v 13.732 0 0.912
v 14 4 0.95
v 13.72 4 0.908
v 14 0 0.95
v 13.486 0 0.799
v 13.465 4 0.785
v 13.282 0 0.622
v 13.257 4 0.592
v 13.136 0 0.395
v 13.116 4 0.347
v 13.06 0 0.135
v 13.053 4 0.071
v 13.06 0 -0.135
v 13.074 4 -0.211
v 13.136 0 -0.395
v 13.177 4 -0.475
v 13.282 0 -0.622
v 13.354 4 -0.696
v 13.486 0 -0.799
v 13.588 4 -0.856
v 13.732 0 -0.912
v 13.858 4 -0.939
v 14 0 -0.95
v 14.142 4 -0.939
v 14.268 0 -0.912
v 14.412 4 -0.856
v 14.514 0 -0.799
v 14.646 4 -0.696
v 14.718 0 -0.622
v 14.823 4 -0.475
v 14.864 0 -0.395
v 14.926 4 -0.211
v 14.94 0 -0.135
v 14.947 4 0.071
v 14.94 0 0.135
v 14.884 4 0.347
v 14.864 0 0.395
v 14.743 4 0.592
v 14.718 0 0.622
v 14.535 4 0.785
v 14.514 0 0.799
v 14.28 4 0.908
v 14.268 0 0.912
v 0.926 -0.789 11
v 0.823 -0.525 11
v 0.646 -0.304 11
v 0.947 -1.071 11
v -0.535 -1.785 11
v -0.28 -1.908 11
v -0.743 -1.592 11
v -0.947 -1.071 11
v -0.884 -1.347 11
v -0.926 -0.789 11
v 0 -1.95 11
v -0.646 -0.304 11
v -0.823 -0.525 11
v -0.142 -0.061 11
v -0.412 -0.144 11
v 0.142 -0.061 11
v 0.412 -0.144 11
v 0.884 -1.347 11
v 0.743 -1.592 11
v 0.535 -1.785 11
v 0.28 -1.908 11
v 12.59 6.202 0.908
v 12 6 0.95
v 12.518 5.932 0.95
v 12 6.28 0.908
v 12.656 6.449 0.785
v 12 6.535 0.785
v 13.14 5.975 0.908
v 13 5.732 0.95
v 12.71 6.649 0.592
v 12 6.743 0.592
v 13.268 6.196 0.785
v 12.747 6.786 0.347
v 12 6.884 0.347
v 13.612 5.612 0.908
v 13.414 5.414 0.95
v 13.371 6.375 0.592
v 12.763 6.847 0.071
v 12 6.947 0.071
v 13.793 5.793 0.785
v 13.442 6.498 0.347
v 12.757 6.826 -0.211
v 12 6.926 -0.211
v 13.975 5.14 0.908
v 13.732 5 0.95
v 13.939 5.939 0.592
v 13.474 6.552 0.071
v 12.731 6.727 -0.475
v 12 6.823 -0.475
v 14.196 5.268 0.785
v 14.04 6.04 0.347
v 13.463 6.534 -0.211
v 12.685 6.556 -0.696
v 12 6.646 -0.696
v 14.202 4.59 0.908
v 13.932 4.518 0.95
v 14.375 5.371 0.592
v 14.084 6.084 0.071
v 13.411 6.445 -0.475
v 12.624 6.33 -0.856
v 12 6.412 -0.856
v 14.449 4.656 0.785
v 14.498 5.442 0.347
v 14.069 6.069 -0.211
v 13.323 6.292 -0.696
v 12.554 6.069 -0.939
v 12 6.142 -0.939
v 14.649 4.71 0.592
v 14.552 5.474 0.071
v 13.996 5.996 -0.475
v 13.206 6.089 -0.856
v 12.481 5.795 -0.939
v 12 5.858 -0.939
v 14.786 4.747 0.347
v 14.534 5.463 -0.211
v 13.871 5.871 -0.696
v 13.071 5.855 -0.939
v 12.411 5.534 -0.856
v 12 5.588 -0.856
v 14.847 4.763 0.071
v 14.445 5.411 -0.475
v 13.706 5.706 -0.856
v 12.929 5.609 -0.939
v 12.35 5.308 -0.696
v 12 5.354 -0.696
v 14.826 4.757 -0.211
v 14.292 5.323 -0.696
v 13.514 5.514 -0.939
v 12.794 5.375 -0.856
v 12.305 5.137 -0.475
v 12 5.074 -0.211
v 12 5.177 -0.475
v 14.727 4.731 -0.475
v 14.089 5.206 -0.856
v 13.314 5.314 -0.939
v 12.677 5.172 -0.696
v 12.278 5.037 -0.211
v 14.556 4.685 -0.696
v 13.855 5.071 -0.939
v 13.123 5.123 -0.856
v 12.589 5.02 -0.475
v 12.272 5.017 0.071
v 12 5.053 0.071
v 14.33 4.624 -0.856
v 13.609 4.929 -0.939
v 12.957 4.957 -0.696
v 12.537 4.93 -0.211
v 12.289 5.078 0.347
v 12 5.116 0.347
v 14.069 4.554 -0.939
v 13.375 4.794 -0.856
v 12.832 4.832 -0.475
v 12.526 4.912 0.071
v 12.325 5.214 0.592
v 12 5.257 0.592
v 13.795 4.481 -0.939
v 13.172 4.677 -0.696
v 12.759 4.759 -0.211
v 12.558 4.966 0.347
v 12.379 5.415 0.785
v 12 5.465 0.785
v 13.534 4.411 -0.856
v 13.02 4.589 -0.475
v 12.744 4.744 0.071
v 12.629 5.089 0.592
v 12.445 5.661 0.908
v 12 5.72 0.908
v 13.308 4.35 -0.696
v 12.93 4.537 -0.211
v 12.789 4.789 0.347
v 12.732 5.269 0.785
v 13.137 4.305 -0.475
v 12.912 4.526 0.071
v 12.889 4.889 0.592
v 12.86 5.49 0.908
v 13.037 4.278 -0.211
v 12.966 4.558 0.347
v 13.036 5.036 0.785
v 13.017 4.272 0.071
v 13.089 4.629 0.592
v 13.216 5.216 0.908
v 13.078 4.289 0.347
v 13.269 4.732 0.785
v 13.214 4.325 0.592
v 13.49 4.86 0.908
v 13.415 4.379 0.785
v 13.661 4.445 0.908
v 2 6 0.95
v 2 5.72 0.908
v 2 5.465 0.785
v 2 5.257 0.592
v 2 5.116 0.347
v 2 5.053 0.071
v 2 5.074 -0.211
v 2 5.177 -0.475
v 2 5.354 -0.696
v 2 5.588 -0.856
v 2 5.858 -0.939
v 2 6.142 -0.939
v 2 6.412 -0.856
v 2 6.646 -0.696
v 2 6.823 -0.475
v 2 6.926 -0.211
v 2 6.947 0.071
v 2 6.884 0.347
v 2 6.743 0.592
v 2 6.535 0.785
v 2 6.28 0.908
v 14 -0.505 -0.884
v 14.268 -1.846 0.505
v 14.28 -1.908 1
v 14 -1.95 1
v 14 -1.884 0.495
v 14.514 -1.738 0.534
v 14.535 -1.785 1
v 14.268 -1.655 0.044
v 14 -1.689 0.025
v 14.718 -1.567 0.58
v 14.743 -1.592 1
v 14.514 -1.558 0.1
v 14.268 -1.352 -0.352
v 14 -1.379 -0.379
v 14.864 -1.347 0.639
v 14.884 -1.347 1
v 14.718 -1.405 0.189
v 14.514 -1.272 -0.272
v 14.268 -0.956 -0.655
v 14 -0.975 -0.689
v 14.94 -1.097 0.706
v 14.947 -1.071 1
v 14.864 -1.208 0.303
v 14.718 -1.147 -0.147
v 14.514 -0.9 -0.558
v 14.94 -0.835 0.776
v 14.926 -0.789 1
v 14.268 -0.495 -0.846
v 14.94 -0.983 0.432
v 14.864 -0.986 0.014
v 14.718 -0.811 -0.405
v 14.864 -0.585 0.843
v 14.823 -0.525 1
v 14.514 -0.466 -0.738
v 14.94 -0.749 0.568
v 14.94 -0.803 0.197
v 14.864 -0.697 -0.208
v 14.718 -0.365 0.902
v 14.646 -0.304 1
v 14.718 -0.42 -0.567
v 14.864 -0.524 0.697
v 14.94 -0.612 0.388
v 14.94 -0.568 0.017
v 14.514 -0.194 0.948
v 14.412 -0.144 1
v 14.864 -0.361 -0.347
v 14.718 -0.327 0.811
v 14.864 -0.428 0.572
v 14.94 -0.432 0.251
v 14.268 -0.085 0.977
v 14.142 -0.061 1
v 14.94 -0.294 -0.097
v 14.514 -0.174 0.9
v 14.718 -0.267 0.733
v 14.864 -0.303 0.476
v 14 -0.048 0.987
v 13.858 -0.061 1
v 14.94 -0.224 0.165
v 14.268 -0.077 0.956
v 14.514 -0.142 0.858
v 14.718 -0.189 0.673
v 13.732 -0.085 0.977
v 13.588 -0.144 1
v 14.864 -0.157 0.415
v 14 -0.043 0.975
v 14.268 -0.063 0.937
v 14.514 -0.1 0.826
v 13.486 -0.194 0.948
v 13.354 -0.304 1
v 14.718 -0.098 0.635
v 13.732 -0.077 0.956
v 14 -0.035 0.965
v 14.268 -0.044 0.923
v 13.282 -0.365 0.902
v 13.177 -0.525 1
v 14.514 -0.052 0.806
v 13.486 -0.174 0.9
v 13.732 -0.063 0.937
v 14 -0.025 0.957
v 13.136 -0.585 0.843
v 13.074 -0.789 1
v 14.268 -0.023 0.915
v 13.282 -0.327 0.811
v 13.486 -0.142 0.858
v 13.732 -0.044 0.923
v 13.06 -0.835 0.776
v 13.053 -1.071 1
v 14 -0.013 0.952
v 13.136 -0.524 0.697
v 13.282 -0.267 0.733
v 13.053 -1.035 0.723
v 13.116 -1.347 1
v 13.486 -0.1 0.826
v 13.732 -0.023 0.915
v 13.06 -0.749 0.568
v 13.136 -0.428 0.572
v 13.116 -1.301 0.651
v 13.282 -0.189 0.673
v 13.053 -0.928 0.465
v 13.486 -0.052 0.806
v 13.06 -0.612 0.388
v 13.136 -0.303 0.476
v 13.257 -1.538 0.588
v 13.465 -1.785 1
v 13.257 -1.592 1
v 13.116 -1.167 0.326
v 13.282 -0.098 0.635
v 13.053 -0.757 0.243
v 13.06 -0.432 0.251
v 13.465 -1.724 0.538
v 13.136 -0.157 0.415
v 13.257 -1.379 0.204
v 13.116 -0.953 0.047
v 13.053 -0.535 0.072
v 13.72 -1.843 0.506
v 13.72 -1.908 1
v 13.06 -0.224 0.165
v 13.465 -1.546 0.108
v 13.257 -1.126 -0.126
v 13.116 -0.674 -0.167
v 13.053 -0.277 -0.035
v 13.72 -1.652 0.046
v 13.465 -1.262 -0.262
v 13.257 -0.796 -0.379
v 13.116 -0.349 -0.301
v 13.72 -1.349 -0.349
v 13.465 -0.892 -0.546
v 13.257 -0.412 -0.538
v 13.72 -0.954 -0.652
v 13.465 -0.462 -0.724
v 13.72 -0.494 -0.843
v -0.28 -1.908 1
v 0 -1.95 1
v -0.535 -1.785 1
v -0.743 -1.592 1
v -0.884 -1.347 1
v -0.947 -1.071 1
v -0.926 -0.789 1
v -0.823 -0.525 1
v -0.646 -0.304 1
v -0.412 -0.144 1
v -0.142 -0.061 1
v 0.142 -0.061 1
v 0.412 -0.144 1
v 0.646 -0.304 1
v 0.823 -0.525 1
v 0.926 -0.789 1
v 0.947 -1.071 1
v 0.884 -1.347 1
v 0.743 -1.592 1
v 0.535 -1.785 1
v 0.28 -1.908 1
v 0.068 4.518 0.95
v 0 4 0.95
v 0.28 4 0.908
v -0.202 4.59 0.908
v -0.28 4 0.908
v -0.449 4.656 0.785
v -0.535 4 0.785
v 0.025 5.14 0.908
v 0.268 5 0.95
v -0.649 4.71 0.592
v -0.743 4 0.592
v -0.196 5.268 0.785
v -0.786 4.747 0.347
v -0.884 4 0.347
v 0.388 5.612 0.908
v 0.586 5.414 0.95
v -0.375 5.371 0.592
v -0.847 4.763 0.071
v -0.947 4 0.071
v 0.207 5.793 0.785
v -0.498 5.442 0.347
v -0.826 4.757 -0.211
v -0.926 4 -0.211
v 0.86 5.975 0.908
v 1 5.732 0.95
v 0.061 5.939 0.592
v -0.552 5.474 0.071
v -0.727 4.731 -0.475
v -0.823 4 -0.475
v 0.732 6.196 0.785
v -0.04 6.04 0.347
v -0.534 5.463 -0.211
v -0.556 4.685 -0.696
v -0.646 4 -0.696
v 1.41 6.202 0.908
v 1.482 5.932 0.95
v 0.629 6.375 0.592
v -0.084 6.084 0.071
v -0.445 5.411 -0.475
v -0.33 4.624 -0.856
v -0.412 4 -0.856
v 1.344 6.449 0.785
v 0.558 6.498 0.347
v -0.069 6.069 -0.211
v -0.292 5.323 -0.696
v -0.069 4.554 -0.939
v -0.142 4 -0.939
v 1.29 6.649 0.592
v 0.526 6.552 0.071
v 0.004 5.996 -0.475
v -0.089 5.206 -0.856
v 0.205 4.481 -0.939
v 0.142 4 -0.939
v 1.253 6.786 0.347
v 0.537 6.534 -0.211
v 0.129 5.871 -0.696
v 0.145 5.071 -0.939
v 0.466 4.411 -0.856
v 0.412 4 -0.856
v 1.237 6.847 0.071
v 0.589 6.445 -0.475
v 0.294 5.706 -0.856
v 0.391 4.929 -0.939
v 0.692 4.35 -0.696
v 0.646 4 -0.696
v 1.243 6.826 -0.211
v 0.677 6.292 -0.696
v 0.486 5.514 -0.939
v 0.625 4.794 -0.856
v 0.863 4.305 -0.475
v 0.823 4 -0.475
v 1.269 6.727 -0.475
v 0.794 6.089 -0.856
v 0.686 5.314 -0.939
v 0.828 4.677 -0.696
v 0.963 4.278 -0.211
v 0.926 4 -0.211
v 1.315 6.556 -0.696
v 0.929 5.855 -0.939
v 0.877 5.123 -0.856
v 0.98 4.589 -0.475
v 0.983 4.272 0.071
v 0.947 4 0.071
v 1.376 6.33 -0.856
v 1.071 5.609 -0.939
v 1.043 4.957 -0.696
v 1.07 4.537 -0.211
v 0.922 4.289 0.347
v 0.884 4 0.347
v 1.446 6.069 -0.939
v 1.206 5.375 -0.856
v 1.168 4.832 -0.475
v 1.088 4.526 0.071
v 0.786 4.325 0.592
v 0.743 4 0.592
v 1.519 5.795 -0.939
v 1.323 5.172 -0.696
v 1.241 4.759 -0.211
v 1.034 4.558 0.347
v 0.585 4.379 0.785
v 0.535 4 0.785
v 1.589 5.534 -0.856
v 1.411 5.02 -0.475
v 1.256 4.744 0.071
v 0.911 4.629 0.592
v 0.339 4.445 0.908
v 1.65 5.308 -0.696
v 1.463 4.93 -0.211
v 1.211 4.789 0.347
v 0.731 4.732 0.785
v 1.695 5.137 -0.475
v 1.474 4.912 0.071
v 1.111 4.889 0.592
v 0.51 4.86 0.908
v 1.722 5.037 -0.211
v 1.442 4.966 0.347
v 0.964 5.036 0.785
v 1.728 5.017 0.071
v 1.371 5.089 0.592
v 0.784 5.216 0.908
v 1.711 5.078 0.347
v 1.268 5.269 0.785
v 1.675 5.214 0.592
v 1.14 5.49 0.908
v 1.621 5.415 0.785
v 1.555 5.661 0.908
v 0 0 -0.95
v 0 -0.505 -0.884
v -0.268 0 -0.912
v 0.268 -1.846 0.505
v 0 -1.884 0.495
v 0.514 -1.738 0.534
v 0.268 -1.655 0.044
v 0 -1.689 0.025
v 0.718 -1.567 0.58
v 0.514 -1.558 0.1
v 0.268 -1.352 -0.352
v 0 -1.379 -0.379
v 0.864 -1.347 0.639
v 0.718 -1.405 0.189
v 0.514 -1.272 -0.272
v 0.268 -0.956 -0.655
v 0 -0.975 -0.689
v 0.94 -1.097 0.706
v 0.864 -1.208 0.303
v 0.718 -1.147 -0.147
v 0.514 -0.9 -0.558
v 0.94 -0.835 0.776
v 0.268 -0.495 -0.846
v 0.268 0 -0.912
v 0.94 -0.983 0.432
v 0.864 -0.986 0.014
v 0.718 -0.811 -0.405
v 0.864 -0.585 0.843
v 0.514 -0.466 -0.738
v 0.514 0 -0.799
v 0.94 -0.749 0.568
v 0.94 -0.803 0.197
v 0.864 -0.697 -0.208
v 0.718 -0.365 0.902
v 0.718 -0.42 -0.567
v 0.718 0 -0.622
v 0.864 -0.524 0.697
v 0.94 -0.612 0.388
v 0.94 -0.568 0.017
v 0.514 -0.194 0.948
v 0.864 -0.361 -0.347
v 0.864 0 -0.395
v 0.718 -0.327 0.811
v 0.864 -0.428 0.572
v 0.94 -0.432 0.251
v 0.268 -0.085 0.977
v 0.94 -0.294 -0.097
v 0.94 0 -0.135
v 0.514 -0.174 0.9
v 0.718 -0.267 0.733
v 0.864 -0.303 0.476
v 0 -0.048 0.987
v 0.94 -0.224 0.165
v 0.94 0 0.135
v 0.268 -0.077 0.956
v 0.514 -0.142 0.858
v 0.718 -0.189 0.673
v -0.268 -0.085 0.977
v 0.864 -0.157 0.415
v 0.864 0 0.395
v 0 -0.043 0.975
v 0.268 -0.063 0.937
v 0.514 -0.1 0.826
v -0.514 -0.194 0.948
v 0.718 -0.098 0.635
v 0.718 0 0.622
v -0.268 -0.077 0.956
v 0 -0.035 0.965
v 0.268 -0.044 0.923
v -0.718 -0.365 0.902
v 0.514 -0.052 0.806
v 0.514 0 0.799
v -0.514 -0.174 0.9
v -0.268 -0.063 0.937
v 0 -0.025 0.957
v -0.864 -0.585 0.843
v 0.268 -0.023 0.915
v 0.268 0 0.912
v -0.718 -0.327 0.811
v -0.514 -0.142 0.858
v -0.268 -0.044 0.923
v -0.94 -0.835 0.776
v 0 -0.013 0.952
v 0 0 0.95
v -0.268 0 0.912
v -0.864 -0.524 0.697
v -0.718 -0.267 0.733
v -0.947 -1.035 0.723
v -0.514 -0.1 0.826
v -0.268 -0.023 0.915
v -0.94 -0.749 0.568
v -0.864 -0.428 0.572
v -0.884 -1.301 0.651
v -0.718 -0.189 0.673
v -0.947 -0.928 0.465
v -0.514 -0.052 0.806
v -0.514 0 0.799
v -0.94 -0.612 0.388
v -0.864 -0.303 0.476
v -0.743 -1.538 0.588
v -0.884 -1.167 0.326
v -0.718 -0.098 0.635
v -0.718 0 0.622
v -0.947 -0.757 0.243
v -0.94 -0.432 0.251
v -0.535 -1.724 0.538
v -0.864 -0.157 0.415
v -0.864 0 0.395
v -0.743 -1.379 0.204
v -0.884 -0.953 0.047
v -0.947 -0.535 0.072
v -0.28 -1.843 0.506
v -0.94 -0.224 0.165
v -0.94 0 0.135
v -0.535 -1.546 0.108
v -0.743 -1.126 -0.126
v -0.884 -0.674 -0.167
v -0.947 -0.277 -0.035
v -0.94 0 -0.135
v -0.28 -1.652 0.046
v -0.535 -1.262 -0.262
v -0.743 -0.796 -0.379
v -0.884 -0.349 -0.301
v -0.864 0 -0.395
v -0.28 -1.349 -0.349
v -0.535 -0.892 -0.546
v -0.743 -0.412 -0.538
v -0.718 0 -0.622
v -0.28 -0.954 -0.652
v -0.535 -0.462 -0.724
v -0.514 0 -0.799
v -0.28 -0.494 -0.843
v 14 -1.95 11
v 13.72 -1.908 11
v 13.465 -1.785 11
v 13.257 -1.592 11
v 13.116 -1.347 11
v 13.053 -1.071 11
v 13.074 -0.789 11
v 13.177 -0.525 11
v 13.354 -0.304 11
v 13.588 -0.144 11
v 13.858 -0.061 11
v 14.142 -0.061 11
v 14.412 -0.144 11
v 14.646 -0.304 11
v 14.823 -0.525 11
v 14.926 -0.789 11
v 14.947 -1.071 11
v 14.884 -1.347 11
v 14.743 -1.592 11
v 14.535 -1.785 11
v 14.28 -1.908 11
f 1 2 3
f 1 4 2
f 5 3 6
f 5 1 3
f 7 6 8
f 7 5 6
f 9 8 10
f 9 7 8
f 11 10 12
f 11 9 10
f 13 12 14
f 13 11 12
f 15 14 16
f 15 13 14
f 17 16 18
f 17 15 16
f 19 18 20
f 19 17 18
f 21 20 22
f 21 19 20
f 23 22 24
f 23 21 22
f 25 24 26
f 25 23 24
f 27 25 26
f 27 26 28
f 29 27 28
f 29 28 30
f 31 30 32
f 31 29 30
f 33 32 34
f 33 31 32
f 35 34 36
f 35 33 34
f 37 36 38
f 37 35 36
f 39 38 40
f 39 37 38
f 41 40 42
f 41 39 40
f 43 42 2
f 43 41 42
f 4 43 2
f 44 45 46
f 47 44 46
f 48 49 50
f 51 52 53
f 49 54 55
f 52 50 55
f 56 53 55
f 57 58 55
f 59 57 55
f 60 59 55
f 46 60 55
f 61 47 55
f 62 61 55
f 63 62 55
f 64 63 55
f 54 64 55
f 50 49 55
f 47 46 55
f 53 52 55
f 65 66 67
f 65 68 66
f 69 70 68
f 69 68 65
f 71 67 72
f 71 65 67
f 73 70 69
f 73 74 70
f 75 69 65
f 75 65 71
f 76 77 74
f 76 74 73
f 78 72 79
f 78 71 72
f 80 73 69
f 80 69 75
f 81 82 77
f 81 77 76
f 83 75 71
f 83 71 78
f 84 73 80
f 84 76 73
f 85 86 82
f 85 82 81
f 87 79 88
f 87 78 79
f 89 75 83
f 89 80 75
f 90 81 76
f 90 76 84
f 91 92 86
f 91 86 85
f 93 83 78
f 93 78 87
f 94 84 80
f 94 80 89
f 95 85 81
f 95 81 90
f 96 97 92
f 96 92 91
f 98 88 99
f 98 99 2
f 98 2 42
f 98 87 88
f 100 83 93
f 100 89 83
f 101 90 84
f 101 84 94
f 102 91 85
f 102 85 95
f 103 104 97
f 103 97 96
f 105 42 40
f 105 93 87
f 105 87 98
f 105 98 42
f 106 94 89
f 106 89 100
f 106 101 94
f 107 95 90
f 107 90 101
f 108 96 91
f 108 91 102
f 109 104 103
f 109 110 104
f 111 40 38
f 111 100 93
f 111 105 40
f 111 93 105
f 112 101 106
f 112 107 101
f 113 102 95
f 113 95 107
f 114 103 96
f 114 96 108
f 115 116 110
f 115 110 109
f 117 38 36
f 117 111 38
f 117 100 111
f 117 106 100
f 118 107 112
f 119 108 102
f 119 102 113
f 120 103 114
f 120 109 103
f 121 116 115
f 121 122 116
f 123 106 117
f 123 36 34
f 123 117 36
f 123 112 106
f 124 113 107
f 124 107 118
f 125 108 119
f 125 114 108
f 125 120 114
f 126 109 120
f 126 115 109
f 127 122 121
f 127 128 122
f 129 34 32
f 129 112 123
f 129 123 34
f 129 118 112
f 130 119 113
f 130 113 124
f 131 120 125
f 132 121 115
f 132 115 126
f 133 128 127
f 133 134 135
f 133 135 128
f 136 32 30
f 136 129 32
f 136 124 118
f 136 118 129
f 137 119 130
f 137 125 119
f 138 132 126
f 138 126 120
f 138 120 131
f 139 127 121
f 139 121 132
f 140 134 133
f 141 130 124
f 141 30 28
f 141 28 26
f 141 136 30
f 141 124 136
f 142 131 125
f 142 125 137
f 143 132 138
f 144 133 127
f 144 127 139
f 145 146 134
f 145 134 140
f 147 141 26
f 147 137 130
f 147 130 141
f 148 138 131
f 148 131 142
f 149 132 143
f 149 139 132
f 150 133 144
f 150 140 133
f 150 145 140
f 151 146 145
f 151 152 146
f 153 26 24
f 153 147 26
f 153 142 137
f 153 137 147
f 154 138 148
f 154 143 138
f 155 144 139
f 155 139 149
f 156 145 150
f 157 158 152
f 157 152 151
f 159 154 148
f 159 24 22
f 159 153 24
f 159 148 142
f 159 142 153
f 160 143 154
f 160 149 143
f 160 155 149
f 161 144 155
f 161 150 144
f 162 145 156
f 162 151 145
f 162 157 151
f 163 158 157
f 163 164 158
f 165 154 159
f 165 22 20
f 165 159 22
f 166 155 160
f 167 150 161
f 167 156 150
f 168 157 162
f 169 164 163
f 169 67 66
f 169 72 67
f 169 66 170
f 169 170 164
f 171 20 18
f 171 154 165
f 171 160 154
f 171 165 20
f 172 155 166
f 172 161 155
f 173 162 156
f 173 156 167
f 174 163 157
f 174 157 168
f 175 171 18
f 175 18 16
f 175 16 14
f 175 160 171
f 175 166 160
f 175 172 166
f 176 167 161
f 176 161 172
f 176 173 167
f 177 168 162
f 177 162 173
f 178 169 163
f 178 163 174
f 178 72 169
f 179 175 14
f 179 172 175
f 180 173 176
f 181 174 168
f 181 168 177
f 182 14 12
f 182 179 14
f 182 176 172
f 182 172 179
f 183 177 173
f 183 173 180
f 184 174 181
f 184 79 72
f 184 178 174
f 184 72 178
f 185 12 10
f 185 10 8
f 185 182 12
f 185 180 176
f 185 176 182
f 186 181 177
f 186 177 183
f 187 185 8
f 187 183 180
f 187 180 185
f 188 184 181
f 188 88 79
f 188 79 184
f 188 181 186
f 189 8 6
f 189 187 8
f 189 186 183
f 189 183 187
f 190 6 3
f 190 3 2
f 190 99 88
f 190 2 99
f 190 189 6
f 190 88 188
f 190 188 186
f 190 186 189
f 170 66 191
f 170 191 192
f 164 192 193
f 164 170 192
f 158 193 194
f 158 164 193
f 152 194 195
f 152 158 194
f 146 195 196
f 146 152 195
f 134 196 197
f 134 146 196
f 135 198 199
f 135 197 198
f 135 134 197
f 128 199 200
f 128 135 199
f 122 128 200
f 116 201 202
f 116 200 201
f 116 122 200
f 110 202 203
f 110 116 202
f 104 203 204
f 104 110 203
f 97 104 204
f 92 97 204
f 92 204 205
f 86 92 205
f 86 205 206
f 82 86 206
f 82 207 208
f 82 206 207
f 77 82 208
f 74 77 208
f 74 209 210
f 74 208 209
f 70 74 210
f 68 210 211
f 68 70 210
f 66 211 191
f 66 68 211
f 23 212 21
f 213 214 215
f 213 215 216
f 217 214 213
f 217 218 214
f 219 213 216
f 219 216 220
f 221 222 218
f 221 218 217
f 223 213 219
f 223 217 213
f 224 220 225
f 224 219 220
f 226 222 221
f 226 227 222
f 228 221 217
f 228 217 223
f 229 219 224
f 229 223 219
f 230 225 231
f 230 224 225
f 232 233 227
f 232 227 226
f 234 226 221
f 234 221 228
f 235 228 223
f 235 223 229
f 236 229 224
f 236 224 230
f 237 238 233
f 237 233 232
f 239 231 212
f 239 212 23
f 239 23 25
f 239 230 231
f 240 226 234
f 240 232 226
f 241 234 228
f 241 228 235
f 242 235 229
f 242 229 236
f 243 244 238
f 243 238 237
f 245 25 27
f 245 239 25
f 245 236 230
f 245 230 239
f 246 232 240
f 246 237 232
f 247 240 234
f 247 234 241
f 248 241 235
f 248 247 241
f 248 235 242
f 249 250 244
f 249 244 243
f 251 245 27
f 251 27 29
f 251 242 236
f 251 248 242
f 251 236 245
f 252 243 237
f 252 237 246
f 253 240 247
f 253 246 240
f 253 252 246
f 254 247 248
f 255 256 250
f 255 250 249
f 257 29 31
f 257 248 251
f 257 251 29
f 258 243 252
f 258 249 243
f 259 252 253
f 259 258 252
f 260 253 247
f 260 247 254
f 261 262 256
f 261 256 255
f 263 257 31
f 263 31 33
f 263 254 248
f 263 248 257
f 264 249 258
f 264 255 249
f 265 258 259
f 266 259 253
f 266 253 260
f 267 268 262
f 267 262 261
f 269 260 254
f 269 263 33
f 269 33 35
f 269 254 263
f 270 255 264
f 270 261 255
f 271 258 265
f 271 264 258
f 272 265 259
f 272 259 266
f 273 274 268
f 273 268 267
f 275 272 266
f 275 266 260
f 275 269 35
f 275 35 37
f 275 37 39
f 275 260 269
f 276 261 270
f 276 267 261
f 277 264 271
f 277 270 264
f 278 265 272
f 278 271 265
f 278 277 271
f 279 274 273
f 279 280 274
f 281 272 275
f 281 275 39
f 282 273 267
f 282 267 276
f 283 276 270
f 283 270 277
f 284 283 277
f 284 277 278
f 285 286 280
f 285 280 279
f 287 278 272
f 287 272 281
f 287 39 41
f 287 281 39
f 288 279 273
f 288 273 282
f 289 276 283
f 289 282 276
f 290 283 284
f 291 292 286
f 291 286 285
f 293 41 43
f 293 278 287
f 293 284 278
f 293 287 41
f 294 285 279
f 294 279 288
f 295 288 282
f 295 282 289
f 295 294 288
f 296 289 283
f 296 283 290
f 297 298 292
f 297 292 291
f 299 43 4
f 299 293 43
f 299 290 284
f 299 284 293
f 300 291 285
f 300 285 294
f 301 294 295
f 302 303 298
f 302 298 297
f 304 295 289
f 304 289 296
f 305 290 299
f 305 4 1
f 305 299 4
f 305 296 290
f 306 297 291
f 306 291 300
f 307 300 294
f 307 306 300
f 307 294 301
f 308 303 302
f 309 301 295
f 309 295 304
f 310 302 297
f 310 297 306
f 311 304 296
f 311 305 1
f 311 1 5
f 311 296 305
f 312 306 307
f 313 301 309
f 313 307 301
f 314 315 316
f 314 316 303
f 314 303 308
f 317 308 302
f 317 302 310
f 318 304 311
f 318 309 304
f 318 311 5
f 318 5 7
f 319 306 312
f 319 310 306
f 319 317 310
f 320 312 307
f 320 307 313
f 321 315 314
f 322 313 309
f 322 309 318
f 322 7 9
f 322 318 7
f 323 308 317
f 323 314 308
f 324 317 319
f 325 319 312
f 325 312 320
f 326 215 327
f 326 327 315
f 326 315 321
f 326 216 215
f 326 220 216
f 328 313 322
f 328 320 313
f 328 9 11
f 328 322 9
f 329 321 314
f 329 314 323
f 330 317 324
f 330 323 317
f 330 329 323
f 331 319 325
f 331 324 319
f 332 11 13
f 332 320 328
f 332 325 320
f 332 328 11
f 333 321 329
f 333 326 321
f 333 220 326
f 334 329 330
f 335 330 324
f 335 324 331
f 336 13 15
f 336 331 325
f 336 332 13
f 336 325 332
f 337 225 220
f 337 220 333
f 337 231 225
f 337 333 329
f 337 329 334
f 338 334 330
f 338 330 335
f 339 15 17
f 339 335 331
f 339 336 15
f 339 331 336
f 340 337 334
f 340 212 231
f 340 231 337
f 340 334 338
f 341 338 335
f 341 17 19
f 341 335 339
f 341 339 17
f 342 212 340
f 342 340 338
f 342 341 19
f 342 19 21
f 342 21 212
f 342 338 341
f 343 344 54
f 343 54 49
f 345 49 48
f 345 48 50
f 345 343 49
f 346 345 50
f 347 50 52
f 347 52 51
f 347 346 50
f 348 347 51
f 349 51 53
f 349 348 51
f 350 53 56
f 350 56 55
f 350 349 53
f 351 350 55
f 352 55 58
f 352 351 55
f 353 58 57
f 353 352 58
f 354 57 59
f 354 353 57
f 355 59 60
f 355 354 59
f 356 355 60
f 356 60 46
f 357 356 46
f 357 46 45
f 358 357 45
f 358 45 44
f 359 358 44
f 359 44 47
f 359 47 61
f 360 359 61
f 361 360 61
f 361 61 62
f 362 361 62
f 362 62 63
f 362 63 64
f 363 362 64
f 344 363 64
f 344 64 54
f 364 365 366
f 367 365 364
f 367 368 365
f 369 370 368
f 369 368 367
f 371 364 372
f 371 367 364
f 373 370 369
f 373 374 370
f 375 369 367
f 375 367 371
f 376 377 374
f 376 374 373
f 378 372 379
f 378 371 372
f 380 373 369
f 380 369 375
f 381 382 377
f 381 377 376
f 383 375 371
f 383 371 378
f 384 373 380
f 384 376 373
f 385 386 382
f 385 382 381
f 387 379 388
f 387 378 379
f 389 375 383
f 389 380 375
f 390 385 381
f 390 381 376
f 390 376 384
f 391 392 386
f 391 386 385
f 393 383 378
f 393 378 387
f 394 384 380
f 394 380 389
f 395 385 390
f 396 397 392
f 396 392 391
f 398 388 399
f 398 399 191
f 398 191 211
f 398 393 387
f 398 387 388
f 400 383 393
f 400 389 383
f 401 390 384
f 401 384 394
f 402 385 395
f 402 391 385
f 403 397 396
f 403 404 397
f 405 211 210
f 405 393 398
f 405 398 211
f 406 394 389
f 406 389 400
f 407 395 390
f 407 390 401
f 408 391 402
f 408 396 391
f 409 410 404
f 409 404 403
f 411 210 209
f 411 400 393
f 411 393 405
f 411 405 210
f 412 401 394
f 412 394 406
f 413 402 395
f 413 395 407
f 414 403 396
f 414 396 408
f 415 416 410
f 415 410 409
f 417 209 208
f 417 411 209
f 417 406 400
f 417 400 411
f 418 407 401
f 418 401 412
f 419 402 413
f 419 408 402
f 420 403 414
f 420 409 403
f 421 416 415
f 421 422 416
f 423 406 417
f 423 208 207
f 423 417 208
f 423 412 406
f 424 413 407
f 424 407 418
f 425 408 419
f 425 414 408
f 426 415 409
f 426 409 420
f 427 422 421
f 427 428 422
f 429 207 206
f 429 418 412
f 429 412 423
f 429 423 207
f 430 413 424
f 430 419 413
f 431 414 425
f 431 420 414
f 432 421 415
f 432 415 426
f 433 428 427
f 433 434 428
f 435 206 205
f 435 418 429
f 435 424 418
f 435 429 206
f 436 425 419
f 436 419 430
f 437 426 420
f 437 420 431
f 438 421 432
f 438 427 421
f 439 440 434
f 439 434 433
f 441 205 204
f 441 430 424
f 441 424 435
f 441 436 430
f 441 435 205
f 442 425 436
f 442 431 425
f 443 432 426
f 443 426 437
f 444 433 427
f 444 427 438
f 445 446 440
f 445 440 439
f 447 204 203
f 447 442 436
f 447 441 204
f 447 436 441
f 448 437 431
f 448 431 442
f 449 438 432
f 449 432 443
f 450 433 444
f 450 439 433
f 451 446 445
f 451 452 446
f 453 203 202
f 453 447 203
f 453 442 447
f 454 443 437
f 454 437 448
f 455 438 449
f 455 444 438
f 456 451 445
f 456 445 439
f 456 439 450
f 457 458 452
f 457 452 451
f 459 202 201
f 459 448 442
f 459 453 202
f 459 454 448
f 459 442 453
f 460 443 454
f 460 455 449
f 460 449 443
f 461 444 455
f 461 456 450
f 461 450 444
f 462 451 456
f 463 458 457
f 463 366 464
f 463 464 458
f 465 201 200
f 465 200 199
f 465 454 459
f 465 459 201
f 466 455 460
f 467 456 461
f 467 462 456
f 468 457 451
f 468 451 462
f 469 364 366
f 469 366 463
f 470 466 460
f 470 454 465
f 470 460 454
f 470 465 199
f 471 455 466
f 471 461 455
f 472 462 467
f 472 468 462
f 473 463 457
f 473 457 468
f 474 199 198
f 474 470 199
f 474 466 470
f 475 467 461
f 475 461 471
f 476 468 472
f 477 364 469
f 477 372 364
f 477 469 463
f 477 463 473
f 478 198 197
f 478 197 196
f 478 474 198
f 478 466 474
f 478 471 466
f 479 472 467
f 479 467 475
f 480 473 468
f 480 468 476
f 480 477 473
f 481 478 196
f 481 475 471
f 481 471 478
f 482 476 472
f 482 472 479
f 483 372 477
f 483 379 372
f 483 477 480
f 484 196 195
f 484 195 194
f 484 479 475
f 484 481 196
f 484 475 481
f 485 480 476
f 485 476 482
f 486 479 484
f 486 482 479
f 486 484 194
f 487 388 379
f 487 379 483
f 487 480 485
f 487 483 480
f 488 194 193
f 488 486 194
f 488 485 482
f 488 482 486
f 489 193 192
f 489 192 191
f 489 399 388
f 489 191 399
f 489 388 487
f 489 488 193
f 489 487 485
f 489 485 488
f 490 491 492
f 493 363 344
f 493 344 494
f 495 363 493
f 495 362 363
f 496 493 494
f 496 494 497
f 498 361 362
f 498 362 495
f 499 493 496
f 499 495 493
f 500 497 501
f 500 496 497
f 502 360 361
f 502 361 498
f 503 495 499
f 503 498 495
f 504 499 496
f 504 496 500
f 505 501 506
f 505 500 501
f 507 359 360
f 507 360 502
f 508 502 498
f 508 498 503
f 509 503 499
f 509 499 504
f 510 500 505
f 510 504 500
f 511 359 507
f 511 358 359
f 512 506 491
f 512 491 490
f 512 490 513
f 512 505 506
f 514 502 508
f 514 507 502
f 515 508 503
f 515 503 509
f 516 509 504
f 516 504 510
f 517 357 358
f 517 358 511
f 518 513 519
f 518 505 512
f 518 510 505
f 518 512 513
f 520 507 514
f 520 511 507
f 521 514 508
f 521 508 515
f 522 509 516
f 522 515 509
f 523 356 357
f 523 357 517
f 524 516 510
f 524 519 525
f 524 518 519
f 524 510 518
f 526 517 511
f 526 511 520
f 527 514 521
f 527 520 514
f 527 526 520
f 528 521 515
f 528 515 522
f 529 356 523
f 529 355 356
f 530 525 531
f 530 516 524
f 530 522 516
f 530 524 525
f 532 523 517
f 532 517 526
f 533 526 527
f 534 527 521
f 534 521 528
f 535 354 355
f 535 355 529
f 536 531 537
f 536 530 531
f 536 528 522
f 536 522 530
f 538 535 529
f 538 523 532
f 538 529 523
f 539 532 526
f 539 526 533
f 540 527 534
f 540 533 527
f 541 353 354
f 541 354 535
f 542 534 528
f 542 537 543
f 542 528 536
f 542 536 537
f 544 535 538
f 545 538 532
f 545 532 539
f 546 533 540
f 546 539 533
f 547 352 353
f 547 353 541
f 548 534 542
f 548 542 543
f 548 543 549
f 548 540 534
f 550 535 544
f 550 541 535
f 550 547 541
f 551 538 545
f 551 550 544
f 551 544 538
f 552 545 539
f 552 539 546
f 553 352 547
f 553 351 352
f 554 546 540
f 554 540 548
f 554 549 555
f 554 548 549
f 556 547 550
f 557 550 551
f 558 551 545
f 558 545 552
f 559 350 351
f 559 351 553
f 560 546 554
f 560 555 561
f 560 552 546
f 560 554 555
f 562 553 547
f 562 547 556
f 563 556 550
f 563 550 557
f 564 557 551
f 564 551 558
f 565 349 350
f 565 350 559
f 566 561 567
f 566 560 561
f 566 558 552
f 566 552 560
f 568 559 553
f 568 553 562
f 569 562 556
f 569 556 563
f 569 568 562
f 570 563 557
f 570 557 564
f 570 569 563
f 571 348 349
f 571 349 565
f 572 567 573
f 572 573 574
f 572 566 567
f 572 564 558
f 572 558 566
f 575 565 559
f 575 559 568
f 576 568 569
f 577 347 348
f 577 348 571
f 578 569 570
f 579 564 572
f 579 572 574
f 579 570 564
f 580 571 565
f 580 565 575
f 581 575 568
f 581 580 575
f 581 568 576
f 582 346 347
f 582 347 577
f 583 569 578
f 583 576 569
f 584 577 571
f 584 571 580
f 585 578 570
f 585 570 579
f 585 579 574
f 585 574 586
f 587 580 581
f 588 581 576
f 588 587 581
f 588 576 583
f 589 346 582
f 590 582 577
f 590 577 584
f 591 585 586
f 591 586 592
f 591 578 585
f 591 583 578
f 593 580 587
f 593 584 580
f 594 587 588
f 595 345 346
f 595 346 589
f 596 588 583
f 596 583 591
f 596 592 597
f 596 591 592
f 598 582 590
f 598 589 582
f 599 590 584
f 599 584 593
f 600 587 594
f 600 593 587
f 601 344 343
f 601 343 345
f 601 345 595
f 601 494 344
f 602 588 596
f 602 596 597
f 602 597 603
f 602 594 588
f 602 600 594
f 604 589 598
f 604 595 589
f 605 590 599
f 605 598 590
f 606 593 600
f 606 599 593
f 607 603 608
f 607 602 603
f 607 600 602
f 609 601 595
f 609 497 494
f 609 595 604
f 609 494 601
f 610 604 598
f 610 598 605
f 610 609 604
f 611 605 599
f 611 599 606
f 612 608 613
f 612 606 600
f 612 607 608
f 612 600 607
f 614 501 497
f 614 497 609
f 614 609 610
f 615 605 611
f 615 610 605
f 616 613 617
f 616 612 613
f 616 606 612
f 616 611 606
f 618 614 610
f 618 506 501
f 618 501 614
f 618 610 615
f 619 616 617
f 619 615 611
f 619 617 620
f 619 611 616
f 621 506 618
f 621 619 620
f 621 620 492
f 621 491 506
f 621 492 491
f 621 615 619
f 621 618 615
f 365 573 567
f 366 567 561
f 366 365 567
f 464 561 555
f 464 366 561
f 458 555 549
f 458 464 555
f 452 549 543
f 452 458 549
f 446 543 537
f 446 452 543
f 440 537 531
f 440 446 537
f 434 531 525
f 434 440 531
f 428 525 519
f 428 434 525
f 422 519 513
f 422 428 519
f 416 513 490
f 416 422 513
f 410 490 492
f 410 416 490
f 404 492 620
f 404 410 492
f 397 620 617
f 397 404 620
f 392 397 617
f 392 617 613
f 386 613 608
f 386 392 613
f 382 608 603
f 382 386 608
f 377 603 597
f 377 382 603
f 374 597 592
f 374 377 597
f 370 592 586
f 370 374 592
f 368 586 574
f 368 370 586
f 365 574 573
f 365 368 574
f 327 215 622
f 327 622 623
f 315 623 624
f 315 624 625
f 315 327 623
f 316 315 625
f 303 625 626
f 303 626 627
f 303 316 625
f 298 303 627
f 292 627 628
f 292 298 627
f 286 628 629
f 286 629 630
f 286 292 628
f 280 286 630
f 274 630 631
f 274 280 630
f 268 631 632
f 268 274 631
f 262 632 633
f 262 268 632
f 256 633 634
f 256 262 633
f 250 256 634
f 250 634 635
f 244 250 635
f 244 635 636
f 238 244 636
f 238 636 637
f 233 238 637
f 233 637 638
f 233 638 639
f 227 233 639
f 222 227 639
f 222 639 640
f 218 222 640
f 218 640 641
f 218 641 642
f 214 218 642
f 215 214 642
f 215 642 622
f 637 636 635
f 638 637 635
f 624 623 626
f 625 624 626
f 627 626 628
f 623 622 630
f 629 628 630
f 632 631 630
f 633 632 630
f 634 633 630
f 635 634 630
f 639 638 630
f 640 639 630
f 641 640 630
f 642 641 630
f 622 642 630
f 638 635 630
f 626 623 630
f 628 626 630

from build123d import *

# Parameters (mm, degrees)
SWEEP5_PROFILE_R = 0.95
SWEEP6_PROFILE_R = 0.95
SWEEP7_PROFILE_R = 0.95


with BuildPart() as part:
    # Sweep5: sweep along a path in Sketch1
    with BuildLine(Plane.XY) as sweep5_path:
        Line((0, 0), (0, 4))
        ThreePointArc((0, 4), (0.585786438, 5.414213562), (2, 6))
        Line((2, 6), (12, 6))
        ThreePointArc((12, 6), (13.414213562, 5.414213562), (14, 4))
        Line((14, 4), (14, 0))
    # Sweep5 profile (on start of the path) → Sweep5 (sweep)
    with BuildSketch(Plane.ZX):
        Circle(SWEEP5_PROFILE_R)
    sweep(path=sweep5_path.line)

    # Sweep6: sweep along a path in Sketch3
    with BuildLine(Plane(origin=(14, 0, 0), x_dir=(0, -1, 0), z_dir=(-1, 0, 0))) as sweep6_path:
        Line((1, 11), (1, 1))
        ThreePointArc((1, 1), (0.707106781, 0.292893219), (0, 0))
    # Sweep6 profile (on start of the path) → Sweep6 (sweep)
    with BuildSketch(Plane(origin=(14, -1, 11), x_dir=(0, -1, 0), z_dir=(0, 0, -1))):
        Circle(SWEEP6_PROFILE_R)
    sweep(path=sweep6_path.line)

    # Sweep7: sweep along a path in Sketch2
    with BuildLine(Plane(origin=(0, 0, 0), x_dir=(0, 0, -1), z_dir=(1, 0, 0))) as sweep7_path:
        Line((-11, -1), (-1, -1))
        ThreePointArc((-1, -1), (-0.292893219, -0.707106781), (0, 0))
    # Sweep7 profile (on start of the path) → Sweep7 (sweep)
    with BuildSketch(Plane(origin=(0, -1, 11), x_dir=(0, -1, 0), z_dir=(0, 0, -1))):
        Circle(SWEEP7_PROFILE_R)
    sweep(path=sweep7_path.line)


solid = part.part
